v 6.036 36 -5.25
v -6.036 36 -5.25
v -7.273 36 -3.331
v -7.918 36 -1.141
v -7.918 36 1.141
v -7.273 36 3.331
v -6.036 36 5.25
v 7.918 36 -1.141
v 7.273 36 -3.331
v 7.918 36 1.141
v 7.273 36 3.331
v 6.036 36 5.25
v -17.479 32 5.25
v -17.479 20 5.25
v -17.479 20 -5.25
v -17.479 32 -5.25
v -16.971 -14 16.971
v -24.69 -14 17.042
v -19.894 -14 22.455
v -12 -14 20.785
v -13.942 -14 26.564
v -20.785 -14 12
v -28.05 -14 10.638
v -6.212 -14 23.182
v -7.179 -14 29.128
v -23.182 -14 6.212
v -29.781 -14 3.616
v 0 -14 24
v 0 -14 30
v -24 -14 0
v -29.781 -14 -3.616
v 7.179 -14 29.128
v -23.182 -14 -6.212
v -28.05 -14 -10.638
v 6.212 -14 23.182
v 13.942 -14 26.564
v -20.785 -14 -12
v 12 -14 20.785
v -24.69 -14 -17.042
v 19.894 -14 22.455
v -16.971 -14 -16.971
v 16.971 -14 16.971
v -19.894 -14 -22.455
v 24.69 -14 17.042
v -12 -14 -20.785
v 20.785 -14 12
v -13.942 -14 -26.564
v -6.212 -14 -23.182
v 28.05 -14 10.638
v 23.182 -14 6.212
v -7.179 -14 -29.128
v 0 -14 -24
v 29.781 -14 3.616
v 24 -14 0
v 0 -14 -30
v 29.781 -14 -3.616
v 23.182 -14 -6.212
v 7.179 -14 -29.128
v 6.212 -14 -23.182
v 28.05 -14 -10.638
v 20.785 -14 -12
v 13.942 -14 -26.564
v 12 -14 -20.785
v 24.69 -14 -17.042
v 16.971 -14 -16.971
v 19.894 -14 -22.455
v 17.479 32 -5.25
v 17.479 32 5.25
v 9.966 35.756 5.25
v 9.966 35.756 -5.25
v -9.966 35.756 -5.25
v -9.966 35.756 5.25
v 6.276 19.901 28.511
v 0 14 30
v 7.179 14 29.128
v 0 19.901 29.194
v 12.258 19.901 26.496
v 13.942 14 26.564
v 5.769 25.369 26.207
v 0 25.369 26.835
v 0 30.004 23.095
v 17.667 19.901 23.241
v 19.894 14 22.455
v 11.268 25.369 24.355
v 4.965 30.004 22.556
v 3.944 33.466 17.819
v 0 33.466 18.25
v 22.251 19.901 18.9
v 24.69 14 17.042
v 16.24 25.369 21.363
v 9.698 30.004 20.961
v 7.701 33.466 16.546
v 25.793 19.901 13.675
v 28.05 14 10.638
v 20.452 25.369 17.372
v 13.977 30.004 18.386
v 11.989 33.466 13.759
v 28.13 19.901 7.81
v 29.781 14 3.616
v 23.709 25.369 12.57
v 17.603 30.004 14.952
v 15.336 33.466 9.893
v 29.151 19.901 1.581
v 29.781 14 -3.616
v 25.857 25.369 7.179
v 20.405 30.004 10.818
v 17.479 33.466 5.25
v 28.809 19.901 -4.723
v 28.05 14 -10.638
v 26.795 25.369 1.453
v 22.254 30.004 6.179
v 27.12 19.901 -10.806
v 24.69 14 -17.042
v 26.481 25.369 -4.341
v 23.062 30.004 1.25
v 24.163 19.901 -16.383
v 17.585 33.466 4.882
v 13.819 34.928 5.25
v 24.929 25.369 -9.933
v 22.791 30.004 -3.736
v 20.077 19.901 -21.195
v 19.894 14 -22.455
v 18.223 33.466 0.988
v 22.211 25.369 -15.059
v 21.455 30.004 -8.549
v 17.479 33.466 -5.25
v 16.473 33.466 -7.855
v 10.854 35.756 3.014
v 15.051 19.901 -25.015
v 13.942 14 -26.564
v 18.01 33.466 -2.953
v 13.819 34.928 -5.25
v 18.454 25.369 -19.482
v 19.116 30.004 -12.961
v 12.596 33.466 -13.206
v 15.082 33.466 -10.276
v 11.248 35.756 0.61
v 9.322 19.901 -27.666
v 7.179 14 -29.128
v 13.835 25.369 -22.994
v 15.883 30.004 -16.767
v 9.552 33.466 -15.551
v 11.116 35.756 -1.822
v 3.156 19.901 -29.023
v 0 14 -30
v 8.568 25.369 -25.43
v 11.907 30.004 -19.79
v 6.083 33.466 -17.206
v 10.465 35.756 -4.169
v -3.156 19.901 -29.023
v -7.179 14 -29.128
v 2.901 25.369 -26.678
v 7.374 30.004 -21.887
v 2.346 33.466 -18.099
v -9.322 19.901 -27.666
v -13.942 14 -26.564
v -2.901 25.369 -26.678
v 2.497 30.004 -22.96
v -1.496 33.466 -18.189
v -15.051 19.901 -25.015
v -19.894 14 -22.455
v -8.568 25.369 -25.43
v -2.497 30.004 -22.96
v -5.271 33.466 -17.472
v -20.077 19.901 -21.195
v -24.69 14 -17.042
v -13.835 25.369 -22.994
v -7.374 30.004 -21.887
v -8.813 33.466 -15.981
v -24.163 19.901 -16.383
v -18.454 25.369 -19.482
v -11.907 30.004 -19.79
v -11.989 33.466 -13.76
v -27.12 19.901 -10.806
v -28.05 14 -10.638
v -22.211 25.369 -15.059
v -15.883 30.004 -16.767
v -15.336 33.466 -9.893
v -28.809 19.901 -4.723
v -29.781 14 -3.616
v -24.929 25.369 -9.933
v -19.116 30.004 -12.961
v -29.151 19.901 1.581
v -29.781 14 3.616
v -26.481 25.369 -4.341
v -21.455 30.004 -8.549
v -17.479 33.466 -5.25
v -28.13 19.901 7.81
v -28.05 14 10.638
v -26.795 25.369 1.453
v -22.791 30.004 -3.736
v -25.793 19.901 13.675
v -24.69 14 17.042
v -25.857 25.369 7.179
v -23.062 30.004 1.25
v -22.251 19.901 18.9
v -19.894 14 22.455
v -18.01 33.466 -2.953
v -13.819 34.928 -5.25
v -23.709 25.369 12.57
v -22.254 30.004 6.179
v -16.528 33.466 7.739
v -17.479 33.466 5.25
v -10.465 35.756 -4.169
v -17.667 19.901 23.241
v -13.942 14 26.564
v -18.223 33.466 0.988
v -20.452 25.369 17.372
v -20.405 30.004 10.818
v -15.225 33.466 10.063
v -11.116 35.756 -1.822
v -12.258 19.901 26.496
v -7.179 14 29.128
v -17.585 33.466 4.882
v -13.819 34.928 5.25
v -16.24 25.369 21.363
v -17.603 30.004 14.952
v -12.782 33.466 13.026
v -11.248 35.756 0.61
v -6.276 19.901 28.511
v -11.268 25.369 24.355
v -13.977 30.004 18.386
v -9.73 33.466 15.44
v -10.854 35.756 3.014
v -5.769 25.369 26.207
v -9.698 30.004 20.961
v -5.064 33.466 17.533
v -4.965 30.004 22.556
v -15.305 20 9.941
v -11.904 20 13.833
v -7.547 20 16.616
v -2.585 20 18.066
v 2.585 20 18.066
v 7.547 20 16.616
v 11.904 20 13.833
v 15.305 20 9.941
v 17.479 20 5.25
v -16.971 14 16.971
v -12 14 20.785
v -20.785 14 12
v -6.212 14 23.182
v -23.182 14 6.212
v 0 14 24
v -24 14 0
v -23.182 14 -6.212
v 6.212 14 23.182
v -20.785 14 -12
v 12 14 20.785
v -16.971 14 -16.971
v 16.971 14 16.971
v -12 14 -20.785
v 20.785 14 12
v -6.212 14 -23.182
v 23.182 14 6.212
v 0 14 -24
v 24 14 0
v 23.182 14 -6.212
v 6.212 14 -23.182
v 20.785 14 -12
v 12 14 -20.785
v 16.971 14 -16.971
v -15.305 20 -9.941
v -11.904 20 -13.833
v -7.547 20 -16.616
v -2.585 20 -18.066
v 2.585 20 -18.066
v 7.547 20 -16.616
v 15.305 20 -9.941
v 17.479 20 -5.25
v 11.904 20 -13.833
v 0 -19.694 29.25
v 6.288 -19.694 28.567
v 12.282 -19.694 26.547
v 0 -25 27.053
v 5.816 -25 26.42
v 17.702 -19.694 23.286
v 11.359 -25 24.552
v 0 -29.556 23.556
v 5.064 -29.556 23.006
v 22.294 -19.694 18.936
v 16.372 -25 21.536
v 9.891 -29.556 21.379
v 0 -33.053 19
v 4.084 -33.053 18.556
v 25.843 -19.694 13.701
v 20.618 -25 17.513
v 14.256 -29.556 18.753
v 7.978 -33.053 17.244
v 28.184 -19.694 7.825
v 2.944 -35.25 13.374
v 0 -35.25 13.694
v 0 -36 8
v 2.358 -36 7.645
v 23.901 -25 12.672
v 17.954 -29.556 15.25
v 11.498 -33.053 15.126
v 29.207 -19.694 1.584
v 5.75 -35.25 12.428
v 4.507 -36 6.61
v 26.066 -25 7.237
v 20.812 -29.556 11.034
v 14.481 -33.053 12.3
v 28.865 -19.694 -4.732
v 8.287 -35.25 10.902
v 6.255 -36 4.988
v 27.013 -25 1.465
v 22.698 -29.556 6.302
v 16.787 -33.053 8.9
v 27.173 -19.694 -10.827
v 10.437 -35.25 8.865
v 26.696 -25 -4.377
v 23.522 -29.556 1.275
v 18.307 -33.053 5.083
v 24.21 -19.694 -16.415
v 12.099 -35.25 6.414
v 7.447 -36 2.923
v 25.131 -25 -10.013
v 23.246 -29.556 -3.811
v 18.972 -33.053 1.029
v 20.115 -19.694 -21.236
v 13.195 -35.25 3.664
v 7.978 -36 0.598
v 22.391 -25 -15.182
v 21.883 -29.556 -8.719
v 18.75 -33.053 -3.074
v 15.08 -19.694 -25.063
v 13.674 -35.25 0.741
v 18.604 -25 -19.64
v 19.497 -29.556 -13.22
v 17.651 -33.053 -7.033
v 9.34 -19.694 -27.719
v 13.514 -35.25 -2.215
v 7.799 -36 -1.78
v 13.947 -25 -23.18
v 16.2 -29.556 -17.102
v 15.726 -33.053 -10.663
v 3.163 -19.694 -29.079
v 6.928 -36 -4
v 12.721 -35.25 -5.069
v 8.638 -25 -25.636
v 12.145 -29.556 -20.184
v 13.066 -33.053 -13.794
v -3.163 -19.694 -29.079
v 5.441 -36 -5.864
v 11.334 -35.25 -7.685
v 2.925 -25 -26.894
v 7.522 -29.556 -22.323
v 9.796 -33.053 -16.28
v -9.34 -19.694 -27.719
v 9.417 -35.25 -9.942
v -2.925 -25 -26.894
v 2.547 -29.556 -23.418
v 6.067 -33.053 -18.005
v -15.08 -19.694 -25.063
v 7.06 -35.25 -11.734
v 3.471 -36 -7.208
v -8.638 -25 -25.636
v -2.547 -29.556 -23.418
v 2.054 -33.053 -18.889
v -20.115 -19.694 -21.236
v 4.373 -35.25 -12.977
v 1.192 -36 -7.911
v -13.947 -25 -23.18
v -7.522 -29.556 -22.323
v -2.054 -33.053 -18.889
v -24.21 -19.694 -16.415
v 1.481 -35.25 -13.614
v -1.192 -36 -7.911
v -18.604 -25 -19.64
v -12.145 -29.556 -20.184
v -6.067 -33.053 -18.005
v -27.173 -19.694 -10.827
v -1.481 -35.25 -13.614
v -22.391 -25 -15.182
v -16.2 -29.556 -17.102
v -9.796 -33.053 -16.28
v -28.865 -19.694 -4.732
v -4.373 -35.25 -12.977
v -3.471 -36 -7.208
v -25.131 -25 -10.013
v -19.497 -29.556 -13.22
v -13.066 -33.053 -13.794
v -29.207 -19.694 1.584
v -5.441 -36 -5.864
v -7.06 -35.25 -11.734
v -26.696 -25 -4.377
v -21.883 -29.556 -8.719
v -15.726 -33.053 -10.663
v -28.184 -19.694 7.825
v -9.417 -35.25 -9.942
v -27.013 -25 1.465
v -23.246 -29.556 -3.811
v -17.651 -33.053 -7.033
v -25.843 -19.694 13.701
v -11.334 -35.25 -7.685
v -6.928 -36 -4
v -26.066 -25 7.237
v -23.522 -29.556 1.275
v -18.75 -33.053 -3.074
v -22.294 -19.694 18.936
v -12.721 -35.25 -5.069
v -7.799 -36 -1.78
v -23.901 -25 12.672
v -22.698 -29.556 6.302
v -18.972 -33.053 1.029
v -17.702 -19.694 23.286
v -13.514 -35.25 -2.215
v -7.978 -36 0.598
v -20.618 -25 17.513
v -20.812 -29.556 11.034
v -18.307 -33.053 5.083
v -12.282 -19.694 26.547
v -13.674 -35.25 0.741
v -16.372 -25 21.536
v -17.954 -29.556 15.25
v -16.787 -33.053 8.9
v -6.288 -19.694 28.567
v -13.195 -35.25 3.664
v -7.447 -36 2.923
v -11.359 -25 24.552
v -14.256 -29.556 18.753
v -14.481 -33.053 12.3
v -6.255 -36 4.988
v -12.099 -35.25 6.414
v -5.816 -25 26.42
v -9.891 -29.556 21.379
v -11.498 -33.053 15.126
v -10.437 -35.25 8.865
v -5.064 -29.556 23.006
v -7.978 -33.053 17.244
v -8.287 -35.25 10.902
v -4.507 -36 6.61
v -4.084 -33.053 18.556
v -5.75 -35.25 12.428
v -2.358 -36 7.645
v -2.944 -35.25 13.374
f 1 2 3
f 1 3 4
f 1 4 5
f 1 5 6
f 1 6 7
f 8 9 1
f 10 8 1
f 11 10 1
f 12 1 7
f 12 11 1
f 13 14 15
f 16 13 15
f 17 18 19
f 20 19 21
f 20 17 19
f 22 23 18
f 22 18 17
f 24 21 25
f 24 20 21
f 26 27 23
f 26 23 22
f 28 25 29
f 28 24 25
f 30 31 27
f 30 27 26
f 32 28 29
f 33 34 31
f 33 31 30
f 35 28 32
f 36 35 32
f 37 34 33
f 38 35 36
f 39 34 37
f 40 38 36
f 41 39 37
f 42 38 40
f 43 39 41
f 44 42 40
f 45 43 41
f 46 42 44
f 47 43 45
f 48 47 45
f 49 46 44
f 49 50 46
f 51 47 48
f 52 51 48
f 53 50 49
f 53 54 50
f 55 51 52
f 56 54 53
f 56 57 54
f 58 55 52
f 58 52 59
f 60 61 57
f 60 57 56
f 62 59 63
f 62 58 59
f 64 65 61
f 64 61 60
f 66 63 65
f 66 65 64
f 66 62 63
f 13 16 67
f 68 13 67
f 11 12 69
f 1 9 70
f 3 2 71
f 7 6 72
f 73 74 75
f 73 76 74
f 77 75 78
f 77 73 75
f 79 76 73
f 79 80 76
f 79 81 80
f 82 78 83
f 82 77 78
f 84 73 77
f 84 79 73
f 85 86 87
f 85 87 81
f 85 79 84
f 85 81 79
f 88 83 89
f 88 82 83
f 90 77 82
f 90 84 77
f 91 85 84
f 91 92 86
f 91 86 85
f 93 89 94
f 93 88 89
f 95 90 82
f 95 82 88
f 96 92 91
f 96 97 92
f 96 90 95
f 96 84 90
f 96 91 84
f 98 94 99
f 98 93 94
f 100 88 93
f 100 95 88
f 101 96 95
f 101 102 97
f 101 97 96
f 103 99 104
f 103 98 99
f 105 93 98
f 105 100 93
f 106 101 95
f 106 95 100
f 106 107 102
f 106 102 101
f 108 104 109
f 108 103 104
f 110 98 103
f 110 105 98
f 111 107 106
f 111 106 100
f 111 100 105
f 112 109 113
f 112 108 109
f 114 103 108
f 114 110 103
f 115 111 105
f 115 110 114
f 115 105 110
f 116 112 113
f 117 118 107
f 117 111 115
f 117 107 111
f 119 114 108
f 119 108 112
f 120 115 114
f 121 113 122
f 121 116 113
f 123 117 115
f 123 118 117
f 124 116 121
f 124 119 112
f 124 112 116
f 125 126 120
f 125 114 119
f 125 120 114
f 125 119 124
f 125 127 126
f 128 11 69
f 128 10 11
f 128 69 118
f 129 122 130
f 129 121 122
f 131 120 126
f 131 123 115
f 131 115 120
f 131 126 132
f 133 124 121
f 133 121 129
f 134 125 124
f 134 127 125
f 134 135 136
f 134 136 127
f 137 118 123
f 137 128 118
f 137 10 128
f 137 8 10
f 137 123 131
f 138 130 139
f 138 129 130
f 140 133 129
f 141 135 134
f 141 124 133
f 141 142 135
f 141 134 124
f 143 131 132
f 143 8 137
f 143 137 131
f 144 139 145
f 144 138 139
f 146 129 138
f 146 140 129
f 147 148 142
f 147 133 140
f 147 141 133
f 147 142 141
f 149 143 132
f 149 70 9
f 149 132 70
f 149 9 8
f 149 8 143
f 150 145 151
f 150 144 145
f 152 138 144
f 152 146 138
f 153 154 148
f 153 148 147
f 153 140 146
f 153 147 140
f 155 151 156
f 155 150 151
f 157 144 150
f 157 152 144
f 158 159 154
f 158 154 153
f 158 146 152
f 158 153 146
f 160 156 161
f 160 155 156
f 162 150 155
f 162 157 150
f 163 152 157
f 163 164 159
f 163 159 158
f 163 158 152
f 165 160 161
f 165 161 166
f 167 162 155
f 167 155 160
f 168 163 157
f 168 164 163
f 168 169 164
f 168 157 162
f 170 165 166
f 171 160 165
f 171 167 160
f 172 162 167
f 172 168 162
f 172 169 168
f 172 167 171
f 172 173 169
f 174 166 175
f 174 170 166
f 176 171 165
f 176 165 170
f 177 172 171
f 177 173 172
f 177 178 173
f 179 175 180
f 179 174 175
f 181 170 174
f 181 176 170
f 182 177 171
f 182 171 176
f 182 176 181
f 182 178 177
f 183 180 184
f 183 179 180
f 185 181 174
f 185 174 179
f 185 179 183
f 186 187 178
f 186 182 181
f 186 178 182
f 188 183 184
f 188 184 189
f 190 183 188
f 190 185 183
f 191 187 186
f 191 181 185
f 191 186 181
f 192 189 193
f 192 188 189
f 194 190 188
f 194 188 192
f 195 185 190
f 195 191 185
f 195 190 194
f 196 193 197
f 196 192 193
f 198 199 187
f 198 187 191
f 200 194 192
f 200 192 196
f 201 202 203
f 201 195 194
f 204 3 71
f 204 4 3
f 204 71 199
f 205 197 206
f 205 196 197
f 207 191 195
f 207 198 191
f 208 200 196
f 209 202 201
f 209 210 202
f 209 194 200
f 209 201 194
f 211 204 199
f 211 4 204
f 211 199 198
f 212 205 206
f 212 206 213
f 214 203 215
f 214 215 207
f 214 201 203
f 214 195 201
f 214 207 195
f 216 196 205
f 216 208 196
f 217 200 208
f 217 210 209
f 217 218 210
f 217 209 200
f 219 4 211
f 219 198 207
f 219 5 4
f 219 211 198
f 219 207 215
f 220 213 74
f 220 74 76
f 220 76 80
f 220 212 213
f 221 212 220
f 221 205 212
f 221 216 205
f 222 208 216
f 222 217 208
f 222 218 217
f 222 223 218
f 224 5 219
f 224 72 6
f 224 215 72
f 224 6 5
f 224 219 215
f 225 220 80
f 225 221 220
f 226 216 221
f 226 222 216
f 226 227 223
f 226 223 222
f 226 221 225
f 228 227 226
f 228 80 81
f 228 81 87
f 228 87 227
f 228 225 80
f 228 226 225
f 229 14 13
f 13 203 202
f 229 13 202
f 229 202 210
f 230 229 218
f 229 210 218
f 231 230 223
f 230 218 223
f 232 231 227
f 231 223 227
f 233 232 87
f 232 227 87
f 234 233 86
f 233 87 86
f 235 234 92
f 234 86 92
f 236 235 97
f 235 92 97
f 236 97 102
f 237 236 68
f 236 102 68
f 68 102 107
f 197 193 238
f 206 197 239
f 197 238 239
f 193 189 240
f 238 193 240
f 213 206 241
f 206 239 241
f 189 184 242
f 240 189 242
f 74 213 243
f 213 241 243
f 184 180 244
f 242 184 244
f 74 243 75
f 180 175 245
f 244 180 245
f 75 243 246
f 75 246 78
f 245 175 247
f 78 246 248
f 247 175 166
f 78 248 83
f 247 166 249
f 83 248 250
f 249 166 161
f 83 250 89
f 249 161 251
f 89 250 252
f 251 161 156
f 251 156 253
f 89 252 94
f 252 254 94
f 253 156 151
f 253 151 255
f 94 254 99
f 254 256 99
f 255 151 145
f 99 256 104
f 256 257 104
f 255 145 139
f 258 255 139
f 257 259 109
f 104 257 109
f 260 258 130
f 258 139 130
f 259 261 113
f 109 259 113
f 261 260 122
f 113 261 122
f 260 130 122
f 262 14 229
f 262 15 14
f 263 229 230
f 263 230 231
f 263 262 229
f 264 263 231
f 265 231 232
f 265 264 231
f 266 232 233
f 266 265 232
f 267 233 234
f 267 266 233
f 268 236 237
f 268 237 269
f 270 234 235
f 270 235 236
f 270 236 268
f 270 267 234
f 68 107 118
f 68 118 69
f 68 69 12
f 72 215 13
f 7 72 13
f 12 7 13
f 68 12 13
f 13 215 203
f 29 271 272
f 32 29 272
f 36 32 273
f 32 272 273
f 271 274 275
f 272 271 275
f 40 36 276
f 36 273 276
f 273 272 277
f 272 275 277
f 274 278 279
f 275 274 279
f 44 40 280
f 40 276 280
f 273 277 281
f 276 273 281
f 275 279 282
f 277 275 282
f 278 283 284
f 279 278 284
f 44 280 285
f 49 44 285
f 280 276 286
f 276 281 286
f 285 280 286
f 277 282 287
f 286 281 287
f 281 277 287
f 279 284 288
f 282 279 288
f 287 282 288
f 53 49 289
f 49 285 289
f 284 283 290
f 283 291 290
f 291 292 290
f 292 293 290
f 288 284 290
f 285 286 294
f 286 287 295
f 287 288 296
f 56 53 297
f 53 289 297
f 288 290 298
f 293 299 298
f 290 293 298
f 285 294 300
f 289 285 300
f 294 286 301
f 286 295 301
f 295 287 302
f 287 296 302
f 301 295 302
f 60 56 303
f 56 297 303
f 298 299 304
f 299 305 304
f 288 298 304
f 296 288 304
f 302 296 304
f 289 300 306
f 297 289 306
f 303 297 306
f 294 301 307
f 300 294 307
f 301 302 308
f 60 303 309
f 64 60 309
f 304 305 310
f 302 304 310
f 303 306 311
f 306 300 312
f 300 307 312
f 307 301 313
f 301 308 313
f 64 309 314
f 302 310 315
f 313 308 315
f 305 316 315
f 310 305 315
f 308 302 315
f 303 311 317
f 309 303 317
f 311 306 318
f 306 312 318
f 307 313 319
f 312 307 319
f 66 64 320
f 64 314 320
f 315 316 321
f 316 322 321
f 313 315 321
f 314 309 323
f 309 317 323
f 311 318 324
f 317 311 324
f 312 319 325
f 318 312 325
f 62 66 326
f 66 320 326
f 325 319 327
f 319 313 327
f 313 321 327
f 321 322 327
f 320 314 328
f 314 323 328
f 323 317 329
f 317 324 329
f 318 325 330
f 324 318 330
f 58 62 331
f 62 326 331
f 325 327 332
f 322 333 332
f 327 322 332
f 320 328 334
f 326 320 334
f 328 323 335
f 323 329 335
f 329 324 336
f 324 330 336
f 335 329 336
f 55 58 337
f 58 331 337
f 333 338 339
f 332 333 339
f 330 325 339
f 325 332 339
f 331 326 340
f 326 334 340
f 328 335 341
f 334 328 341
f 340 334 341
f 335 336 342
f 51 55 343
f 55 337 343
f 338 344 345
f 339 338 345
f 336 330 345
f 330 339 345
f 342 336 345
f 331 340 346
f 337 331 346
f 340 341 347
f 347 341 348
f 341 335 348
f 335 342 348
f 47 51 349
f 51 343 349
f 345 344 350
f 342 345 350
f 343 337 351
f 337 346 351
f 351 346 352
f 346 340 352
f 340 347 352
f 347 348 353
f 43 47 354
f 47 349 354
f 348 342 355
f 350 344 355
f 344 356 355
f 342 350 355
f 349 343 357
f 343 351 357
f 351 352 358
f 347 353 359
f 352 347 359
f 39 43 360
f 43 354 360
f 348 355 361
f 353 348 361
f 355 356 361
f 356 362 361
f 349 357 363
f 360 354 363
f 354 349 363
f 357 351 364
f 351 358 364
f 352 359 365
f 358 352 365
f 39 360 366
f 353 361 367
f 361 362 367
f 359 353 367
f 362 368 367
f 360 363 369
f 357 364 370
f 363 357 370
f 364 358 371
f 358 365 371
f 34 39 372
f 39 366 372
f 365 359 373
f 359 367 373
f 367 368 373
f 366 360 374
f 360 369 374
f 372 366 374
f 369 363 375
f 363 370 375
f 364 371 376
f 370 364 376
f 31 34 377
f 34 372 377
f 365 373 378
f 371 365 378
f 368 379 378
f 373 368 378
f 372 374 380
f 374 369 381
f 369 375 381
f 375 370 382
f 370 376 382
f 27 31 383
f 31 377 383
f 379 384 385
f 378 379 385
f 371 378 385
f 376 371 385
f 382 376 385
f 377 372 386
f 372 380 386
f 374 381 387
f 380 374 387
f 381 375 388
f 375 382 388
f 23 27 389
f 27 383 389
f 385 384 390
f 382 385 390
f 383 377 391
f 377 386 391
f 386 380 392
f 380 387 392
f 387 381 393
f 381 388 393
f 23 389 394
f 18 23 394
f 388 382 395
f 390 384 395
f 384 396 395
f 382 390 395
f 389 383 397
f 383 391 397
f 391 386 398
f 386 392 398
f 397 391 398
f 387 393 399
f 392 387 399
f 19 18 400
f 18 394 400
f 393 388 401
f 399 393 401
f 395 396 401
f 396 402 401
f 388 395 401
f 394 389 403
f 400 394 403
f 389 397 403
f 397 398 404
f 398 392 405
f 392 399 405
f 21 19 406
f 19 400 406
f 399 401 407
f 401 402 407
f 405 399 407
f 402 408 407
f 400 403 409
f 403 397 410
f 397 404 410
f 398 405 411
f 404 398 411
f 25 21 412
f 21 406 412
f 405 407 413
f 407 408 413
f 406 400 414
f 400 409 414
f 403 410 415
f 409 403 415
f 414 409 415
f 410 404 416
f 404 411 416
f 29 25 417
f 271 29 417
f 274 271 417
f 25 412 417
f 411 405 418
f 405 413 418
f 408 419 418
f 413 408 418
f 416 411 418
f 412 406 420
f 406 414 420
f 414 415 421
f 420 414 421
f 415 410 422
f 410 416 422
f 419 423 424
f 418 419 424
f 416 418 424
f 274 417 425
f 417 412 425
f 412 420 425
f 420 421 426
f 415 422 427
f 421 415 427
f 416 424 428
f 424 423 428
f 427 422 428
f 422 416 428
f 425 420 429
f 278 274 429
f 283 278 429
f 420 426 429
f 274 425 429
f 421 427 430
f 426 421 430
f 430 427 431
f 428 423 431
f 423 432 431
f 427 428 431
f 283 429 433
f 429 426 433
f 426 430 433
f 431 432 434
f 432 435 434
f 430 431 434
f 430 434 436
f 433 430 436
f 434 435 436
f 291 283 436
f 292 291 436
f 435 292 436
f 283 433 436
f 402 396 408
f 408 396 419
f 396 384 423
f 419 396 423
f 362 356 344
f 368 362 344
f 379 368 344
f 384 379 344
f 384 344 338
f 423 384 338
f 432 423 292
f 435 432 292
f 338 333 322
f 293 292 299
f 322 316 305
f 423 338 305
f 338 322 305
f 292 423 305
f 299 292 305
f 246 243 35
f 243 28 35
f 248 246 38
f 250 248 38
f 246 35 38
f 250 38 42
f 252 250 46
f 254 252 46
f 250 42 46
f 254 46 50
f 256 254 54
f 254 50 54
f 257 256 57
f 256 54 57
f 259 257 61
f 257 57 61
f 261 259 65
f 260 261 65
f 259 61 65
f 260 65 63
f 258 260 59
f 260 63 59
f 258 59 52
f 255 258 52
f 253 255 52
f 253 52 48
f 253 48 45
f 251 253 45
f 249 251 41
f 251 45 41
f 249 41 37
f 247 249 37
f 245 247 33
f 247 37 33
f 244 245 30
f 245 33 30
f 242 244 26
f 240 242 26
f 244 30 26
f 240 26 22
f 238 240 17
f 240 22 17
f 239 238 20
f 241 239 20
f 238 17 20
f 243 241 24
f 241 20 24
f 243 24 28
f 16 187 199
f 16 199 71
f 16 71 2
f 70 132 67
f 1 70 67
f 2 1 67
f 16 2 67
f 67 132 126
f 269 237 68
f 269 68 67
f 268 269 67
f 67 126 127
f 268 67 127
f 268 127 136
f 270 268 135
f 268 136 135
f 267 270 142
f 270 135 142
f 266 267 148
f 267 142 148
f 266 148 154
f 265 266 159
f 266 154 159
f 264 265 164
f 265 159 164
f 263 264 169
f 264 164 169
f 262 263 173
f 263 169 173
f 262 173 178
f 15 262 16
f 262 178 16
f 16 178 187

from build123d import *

# Parameters (mm, degrees)
SKETCH1_R           = 30
BOSS_EXTRUDE1_DEPTH = 36
FILLET1_R           = 22
FILLET2_R           = 22
SKETCH3_OUTSIDE_W   = 84.256
SKETCH3_OUTSIDE_H   = 84.256
SKETCH3_OUTSIDE_R   = 24
CUT_EXTRUDE2_DEPTH  = 14
CUT_EXTRUDE3_DEPTH  = 16
SKETCH6_W           = 34.957116586
SKETCH6_H           = 10.5
CUT_EXTRUDE9_DEPTH  = 12


with BuildPart() as part:
    # Sketch1 → Boss-Extrude1 (new, symmetric)
    with BuildSketch(Plane(origin=(0, 0, 0), x_dir=(1, 0, 0), z_dir=(0, 1, 0))):
        with Locations(Location((0, 0, 0), (0, 0, 270))):
            Circle(SKETCH1_R)
    extrude(amount=BOSS_EXTRUDE1_DEPTH, both=True)

    # Fillet1
    fillet1_edges = [part.edges().sort_by_distance(p)[0] for p in [
        (0, 36, -30),
    ]]
    fillet(fillet1_edges, radius=FILLET1_R)

    # Fillet2
    fillet2_edges = [part.edges().sort_by_distance(p)[0] for p in [
        (0, -36, -30),
    ]]
    fillet(fillet2_edges, radius=FILLET2_R)

    # Sketch3 outside → Cut-Extrude2 (cut, symmetric)
    with BuildSketch(Plane(origin=(0, 0, 0), x_dir=(1, 0, 0), z_dir=(0, 1, 0))):
        Rectangle(SKETCH3_OUTSIDE_W, SKETCH3_OUTSIDE_H)
        with Locations(Location((0, 0, 0), (0, 0, 270))):
            Circle(SKETCH3_OUTSIDE_R, mode=Mode.SUBTRACT)
    extrude(amount=CUT_EXTRUDE2_DEPTH, both=True, mode=Mode.SUBTRACT)

    # Sketch4 → Cut-Extrude3 (cut)
    with BuildSketch(Plane(origin=(0, 36, 0), x_dir=(1, 0, 0), z_dir=(0, 1, 0))):
        with BuildLine():
            ThreePointArc((6.036348234, 5.25), (0, 8), (-6.036348234, 5.25))
            Line((-6.036348234, 5.25), (6.036348234, 5.25))
        make_face()
        with BuildLine():
            ThreePointArc((17.478558293, 5.25), (0, 18.25), (-17.478558293, 5.25))
            Line((-17.478558293, 5.25), (-6.036348234, 5.25))
            ThreePointArc((-6.036348234, 5.25), (0, 8), (6.036348234, 5.25))
            Line((6.036348234, 5.25), (17.478558293, 5.25))
        make_face()
        with BuildLine():
            Line((6.036348234, -5.25), (-6.036348234, -5.25))
            ThreePointArc((-6.036348234, -5.25), (0, -8), (6.036348234, -5.25))
        make_face()
        with BuildLine():
            Line((-6.036348234, -5.25), (-17.478558293, -5.25))
            ThreePointArc((-17.478558293, -5.25), (0, -18.25), (17.478558293, -5.25))
            Line((17.478558293, -5.25), (6.036348234, -5.25))
            ThreePointArc((6.036348234, -5.25), (0, -8), (-6.036348234, -5.25))
        make_face()
    extrude(amount=-CUT_EXTRUDE3_DEPTH, mode=Mode.SUBTRACT)

    # Sketch6 → Cut-Extrude9 (cut)
    with BuildSketch(Plane(origin=(0, 20, 0), x_dir=(1, 0, 0), z_dir=(0, 1, 0))):
        Rectangle(SKETCH6_W, SKETCH6_H)
    extrude(amount=CUT_EXTRUDE9_DEPTH, mode=Mode.SUBTRACT)


solid = part.part
